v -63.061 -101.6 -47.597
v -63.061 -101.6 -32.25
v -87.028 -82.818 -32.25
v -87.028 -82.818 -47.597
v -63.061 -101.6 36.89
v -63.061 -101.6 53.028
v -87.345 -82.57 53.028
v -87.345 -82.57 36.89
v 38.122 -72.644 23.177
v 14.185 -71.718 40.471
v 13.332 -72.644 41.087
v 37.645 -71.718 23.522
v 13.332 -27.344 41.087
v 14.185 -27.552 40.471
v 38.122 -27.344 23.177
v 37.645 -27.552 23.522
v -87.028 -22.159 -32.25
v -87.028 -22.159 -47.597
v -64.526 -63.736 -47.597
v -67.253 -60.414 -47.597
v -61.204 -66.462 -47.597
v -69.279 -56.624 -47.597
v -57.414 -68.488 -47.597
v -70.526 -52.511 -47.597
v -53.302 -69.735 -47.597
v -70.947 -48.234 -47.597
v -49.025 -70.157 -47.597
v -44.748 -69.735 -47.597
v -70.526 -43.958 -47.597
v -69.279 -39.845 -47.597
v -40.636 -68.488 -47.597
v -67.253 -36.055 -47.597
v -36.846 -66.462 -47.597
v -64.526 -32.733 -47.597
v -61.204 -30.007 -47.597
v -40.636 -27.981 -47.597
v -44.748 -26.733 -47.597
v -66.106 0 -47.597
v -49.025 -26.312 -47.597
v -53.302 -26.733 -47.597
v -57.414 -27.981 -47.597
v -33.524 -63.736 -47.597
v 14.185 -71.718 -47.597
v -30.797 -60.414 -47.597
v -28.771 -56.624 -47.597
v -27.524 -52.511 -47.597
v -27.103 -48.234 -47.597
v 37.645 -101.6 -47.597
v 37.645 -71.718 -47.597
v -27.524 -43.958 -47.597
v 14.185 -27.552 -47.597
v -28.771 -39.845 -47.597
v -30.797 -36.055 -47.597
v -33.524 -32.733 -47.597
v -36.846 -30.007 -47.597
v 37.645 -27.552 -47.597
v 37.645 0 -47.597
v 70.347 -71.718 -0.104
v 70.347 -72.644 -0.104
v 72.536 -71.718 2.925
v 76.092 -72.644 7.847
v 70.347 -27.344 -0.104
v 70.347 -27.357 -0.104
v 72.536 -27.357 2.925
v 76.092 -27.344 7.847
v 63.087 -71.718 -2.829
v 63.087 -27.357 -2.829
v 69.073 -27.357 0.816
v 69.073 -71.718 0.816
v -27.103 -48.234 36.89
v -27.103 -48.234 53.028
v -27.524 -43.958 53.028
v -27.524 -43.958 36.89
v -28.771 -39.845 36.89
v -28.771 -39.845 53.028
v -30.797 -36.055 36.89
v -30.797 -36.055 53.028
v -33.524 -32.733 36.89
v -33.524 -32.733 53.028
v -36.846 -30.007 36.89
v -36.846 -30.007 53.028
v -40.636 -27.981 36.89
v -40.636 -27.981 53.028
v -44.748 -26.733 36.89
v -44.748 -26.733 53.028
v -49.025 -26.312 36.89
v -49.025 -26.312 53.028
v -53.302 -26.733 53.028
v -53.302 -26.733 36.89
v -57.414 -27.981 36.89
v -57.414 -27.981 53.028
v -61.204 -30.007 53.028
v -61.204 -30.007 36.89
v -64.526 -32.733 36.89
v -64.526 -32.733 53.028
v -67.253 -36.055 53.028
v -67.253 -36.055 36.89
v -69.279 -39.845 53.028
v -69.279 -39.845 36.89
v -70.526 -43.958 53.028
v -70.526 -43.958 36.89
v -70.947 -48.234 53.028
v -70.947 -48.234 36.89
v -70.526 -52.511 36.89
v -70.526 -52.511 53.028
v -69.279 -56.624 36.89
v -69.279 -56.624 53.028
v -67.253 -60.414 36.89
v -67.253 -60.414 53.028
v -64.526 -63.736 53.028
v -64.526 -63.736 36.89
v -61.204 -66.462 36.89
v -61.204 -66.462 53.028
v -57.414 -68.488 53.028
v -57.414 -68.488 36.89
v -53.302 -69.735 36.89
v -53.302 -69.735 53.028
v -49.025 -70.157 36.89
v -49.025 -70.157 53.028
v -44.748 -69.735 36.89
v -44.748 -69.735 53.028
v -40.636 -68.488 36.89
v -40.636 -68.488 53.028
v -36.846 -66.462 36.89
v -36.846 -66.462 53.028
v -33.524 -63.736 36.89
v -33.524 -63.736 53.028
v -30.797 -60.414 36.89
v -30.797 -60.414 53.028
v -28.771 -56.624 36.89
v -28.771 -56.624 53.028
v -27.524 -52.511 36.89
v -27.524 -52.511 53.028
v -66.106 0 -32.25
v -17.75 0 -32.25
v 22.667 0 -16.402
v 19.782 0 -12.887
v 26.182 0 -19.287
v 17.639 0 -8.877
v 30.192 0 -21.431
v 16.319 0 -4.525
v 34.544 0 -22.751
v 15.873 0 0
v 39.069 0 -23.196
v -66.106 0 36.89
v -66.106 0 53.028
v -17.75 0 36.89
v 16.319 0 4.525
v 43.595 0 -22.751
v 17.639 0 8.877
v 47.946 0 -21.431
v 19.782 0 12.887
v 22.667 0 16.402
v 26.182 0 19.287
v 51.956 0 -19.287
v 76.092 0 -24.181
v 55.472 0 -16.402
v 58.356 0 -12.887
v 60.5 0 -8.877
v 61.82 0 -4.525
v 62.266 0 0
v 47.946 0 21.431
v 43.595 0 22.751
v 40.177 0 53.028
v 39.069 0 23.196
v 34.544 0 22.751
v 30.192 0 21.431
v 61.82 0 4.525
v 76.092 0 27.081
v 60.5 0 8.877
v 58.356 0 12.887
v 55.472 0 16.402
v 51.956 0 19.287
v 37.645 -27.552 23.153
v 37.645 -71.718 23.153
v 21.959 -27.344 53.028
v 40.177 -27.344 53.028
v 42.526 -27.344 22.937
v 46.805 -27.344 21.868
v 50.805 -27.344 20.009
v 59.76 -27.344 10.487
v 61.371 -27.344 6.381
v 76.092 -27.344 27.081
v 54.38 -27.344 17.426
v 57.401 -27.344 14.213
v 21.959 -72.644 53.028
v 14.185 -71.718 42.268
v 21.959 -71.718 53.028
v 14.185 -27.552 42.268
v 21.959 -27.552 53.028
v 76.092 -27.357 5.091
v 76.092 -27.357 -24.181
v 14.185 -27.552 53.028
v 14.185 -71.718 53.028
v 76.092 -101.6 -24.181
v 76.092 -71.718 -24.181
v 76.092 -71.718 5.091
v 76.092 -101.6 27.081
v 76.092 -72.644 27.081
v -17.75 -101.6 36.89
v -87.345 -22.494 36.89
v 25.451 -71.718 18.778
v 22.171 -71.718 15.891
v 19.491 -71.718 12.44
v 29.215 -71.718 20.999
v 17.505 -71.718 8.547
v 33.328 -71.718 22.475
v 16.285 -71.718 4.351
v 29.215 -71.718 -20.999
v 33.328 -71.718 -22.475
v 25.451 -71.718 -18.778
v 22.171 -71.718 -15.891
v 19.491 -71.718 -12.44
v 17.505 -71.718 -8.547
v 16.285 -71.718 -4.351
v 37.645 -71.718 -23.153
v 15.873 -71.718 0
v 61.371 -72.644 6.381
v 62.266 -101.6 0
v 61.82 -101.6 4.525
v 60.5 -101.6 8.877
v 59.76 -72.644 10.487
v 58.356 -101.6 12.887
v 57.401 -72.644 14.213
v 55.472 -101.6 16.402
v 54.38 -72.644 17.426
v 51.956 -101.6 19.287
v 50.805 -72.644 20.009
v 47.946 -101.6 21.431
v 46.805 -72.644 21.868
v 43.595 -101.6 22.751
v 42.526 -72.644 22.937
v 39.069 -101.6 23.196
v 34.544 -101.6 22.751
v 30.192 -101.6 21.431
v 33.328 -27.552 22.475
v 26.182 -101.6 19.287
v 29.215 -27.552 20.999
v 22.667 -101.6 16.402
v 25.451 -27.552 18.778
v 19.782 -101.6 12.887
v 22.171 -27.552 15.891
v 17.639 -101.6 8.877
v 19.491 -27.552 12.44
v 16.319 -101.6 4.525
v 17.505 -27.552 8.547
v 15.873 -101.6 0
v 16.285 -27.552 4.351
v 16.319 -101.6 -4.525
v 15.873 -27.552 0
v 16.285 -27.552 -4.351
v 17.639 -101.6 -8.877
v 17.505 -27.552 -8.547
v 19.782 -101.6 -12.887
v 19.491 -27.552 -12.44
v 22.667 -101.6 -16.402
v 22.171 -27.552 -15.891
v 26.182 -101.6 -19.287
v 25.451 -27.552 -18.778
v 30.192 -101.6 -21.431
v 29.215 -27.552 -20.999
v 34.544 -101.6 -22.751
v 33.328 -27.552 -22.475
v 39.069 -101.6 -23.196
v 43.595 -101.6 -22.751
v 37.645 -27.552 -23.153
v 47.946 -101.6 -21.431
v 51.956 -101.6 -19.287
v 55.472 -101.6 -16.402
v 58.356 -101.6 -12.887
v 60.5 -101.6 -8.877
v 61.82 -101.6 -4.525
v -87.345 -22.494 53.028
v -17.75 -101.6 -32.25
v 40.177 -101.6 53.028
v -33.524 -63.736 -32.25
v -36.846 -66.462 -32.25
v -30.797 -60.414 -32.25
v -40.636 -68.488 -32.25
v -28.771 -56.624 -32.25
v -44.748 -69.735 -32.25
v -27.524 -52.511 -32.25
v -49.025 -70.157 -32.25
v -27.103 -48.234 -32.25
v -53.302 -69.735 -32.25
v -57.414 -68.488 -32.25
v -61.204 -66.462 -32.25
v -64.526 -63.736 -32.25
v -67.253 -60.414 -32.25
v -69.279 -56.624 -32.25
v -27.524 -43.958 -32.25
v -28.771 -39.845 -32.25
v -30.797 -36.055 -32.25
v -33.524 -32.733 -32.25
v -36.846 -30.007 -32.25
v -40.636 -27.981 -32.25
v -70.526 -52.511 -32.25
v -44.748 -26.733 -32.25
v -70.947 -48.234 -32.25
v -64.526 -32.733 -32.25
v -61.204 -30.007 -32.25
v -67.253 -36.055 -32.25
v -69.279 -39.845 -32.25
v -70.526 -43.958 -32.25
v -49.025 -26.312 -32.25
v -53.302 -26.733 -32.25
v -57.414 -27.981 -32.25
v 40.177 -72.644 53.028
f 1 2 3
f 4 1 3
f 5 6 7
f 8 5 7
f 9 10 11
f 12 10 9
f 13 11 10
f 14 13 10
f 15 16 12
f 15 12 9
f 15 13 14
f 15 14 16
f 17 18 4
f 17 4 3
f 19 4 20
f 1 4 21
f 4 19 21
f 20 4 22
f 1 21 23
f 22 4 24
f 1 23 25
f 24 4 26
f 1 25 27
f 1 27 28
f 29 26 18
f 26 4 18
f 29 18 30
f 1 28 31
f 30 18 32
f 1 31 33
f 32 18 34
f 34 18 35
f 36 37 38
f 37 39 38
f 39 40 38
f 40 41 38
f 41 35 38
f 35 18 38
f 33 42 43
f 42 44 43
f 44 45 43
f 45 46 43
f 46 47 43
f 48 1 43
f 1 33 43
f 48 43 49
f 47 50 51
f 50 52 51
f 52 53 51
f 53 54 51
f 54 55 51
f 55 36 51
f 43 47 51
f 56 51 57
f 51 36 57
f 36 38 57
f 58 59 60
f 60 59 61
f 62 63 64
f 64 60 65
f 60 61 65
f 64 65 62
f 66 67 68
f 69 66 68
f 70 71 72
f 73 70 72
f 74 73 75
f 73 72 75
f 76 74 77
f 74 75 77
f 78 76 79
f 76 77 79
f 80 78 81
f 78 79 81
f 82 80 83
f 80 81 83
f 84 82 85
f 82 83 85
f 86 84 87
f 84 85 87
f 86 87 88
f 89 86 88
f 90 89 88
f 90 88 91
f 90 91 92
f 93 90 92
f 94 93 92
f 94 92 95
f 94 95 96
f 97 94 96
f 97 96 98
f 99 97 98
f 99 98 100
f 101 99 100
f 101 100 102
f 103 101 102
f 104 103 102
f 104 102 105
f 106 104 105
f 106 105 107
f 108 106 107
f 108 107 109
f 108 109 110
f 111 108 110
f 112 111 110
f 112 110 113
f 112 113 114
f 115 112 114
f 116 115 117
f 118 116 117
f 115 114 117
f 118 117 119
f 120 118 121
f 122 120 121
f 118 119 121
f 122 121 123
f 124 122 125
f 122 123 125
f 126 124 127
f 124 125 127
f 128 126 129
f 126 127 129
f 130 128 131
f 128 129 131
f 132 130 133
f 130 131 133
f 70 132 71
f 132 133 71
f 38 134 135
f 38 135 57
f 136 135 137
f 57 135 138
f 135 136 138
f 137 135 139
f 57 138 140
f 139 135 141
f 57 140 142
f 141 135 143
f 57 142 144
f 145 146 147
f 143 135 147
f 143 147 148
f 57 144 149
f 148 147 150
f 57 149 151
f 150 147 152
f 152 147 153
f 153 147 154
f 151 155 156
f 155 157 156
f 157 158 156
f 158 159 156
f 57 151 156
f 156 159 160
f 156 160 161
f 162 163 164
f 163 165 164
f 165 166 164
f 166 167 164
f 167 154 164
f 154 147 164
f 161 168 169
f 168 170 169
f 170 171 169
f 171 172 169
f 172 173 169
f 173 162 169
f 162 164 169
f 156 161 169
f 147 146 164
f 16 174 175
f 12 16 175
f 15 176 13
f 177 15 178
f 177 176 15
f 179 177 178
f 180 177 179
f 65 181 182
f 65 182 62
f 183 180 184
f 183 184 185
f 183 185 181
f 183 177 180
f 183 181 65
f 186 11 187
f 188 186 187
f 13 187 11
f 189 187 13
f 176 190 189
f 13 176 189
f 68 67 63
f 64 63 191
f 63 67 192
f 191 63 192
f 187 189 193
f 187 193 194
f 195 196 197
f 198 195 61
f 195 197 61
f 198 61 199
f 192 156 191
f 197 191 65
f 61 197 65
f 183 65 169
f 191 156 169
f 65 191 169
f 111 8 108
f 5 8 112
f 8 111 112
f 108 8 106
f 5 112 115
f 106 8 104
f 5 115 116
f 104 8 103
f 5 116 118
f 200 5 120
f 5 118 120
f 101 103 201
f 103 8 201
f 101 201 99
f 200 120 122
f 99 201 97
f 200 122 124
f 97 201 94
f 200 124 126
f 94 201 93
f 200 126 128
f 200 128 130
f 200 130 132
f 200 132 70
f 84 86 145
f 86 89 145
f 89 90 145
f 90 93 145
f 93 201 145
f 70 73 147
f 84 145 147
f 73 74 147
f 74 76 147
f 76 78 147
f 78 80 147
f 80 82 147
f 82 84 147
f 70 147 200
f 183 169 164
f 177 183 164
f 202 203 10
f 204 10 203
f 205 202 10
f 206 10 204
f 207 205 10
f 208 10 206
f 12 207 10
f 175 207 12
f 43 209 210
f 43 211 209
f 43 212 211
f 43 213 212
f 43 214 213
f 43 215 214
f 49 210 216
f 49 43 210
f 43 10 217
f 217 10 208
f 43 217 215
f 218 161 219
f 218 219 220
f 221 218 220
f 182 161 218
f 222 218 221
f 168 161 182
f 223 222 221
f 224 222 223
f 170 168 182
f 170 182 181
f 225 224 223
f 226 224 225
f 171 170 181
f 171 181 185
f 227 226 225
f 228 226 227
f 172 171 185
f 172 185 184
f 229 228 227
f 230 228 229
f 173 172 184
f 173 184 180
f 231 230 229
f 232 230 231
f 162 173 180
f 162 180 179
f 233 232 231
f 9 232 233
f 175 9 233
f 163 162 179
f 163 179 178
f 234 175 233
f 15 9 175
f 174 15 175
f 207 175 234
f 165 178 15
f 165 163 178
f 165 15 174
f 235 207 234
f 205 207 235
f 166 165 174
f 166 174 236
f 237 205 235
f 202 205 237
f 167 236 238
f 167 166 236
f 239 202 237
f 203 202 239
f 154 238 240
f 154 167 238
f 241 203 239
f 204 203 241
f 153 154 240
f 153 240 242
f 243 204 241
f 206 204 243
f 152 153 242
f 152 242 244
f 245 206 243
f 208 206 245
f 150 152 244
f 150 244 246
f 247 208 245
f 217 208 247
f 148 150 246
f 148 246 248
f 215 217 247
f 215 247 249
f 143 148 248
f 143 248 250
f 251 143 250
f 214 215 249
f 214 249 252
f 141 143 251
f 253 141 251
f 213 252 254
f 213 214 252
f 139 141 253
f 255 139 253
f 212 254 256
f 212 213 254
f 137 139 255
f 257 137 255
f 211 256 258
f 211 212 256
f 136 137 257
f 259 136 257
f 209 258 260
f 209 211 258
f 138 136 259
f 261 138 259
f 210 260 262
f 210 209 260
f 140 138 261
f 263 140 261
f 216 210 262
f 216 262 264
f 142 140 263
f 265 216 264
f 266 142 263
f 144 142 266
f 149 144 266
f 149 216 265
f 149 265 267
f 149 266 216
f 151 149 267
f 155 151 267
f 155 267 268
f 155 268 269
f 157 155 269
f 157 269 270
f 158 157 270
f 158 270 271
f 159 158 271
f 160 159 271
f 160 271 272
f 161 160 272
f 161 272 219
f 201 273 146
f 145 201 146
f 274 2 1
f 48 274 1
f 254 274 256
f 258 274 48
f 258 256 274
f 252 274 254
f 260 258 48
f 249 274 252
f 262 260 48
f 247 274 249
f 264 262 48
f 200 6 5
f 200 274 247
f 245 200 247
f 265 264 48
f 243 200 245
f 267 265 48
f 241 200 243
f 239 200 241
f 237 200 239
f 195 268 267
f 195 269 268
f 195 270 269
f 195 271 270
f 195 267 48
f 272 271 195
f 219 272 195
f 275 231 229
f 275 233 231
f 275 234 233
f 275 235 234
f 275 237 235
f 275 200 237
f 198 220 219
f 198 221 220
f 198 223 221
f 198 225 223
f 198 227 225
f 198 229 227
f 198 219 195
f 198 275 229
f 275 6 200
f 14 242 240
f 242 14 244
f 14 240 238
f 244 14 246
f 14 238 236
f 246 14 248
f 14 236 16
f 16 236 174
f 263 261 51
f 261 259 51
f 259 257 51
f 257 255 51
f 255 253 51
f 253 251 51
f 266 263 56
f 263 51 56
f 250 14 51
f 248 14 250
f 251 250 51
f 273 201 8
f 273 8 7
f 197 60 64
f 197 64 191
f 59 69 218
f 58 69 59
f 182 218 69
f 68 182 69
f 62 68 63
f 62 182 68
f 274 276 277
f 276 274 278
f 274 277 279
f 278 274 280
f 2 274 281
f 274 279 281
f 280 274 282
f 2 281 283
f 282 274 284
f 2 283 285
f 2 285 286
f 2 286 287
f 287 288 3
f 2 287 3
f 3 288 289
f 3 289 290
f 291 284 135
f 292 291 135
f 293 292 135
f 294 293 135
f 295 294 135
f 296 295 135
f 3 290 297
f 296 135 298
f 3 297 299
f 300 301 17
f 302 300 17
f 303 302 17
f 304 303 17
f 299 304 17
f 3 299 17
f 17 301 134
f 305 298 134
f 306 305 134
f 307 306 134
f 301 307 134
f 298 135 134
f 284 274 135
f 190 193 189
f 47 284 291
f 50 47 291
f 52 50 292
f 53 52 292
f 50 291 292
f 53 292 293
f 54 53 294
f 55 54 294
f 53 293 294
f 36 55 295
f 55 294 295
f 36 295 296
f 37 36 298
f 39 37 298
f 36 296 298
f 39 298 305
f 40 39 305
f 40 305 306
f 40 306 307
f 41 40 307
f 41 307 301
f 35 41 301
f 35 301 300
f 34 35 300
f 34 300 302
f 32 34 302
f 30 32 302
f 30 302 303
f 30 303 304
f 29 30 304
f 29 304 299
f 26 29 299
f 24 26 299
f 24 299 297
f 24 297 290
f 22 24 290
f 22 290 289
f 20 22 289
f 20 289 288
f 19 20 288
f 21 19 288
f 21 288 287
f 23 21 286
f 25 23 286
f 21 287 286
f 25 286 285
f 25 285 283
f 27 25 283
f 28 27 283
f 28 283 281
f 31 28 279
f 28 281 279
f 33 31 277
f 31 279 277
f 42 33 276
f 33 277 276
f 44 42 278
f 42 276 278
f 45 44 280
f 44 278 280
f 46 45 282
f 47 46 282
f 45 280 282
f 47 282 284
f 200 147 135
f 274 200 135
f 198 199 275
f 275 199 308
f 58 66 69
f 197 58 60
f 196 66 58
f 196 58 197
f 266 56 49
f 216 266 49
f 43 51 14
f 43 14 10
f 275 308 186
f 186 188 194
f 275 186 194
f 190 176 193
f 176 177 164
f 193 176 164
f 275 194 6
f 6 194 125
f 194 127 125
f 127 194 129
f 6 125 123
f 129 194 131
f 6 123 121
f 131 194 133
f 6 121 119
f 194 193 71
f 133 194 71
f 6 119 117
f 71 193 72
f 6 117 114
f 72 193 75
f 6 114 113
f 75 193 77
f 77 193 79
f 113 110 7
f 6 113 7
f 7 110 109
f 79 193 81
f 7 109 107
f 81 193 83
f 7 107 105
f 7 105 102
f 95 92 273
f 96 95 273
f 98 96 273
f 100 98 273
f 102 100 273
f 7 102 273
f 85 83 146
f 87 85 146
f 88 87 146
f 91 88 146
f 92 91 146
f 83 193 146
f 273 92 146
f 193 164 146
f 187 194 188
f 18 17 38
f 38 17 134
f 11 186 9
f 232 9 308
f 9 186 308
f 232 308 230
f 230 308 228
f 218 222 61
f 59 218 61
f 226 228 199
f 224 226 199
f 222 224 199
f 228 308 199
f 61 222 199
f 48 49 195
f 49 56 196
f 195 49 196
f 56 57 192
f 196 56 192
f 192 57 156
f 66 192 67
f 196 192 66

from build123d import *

# Parameters (mm, degrees)
F0_R      = 23.1963594976
F0_W      = 20.5508206286
F0_H      = 16.1379426718
F0_W_2    = 19.1440358758
F0_H_2    = 15.3468698263
F1_DEPTH  = 101.6
F3_DEPTH  = 152.4
F4_R      = 21.9223320718
F5_DEPTH  = 254
F6_W      = 70.3377723694
F6_H      = 45.2993959188
F7_DEPTH  = 25.4
F8_W      = 23.4599709511
F8_H      = 44.165968895
F9_DEPTH  = 254
F10_W     = 16.7544244835
F10_H     = 44.361397624
F11_DEPTH = 25


with BuildPart() as f1:
    # F0 (on Front) → F1 (new body)
    with BuildSketch(Plane.XZ):
        Polygon((40.1767790318, 53.0281364918), (-66.7938407264, 53.0281364918), (-66.7938407264, 36.89019382), (-17.7499198207, 36.89019382), (-17.7499198207, -32.2498530149), (-67.8841918707, -32.2498530149), (-67.8841918707, -47.5967228413), (37.6453399658, -47.5967228413), (76.091632247, -24.1808742285), (76.091632247, 27.0808488131), align=None)
        with Locations((39.0692800283, 0)):
            Circle(F0_R, mode=Mode.SUBTRACT)
        with Locations((-77.0692510407, 44.9591651559)):
            Rectangle(F0_W, F0_H)
        with Locations((-77.4562098086, -39.9232879281)):
            Rectangle(F0_W_2, F0_H_2)
    extrude(amount=F1_DEPTH)

    # F2 (on face) → F3 (cut)
    with BuildSketch(Plane.XY.offset(53.0281364918)):
        Polygon((-87.344661355, 0), (-87.344661355, -22.4940739572), (-66.105723381, 0), align=None)
        Polygon((-63.0609244108, -101.6), (-87.344661355, -82.5703293085), (-87.344661355, -101.6), align=None)
    extrude(amount=-F3_DEPTH, mode=Mode.SUBTRACT)

    # F4 (on face) → F5 (cut)
    with BuildSketch(Plane.XY.offset(53.0281364918)):
        with Locations((-49.0250661969, -48.2343658805)):
            Circle(F4_R)
    extrude(amount=-F5_DEPTH, mode=Mode.SUBTRACT)

    # F6 (on face) → F7 (cut)
    with BuildSketch(Plane(origin=(38.9509155446, 0, 53.9137821149), x_dir=(0.810585134, 0, -0.5856208164), z_dir=(0.5856208164, 0, 0.810585134))):
        with Locations((21.9143256545, -49.9939098954)):
            Rectangle(F6_W, F6_H)
    extrude(amount=-F7_DEPTH, mode=Mode.SUBTRACT)

    # F8 (on face) → F9 (cut)
    with BuildSketch(Plane(origin=(0, 0, -47.5967228413), x_dir=(1, 0, 0), z_dir=(0, 0, -1))):
        with Locations((25.9153544903, 49.6352612972)):
            Rectangle(F8_W, F8_H)
    extrude(amount=-F9_DEPTH, mode=Mode.SUBTRACT)

    # F10 (on face) → F11 (cut)
    with BuildSketch(Plane(origin=(31.3311681007, 0, -51.4423912721), x_dir=(0.8540627897, 0, 0.5201699254), z_dir=(0.5201699254, 0, -0.8540627897))):
        with Locations((60.7860804046, 49.5375469327)):
            Rectangle(F10_W, F10_H)
    extrude(amount=-F11_DEPTH, mode=Mode.SUBTRACT)


solid = f1.part
